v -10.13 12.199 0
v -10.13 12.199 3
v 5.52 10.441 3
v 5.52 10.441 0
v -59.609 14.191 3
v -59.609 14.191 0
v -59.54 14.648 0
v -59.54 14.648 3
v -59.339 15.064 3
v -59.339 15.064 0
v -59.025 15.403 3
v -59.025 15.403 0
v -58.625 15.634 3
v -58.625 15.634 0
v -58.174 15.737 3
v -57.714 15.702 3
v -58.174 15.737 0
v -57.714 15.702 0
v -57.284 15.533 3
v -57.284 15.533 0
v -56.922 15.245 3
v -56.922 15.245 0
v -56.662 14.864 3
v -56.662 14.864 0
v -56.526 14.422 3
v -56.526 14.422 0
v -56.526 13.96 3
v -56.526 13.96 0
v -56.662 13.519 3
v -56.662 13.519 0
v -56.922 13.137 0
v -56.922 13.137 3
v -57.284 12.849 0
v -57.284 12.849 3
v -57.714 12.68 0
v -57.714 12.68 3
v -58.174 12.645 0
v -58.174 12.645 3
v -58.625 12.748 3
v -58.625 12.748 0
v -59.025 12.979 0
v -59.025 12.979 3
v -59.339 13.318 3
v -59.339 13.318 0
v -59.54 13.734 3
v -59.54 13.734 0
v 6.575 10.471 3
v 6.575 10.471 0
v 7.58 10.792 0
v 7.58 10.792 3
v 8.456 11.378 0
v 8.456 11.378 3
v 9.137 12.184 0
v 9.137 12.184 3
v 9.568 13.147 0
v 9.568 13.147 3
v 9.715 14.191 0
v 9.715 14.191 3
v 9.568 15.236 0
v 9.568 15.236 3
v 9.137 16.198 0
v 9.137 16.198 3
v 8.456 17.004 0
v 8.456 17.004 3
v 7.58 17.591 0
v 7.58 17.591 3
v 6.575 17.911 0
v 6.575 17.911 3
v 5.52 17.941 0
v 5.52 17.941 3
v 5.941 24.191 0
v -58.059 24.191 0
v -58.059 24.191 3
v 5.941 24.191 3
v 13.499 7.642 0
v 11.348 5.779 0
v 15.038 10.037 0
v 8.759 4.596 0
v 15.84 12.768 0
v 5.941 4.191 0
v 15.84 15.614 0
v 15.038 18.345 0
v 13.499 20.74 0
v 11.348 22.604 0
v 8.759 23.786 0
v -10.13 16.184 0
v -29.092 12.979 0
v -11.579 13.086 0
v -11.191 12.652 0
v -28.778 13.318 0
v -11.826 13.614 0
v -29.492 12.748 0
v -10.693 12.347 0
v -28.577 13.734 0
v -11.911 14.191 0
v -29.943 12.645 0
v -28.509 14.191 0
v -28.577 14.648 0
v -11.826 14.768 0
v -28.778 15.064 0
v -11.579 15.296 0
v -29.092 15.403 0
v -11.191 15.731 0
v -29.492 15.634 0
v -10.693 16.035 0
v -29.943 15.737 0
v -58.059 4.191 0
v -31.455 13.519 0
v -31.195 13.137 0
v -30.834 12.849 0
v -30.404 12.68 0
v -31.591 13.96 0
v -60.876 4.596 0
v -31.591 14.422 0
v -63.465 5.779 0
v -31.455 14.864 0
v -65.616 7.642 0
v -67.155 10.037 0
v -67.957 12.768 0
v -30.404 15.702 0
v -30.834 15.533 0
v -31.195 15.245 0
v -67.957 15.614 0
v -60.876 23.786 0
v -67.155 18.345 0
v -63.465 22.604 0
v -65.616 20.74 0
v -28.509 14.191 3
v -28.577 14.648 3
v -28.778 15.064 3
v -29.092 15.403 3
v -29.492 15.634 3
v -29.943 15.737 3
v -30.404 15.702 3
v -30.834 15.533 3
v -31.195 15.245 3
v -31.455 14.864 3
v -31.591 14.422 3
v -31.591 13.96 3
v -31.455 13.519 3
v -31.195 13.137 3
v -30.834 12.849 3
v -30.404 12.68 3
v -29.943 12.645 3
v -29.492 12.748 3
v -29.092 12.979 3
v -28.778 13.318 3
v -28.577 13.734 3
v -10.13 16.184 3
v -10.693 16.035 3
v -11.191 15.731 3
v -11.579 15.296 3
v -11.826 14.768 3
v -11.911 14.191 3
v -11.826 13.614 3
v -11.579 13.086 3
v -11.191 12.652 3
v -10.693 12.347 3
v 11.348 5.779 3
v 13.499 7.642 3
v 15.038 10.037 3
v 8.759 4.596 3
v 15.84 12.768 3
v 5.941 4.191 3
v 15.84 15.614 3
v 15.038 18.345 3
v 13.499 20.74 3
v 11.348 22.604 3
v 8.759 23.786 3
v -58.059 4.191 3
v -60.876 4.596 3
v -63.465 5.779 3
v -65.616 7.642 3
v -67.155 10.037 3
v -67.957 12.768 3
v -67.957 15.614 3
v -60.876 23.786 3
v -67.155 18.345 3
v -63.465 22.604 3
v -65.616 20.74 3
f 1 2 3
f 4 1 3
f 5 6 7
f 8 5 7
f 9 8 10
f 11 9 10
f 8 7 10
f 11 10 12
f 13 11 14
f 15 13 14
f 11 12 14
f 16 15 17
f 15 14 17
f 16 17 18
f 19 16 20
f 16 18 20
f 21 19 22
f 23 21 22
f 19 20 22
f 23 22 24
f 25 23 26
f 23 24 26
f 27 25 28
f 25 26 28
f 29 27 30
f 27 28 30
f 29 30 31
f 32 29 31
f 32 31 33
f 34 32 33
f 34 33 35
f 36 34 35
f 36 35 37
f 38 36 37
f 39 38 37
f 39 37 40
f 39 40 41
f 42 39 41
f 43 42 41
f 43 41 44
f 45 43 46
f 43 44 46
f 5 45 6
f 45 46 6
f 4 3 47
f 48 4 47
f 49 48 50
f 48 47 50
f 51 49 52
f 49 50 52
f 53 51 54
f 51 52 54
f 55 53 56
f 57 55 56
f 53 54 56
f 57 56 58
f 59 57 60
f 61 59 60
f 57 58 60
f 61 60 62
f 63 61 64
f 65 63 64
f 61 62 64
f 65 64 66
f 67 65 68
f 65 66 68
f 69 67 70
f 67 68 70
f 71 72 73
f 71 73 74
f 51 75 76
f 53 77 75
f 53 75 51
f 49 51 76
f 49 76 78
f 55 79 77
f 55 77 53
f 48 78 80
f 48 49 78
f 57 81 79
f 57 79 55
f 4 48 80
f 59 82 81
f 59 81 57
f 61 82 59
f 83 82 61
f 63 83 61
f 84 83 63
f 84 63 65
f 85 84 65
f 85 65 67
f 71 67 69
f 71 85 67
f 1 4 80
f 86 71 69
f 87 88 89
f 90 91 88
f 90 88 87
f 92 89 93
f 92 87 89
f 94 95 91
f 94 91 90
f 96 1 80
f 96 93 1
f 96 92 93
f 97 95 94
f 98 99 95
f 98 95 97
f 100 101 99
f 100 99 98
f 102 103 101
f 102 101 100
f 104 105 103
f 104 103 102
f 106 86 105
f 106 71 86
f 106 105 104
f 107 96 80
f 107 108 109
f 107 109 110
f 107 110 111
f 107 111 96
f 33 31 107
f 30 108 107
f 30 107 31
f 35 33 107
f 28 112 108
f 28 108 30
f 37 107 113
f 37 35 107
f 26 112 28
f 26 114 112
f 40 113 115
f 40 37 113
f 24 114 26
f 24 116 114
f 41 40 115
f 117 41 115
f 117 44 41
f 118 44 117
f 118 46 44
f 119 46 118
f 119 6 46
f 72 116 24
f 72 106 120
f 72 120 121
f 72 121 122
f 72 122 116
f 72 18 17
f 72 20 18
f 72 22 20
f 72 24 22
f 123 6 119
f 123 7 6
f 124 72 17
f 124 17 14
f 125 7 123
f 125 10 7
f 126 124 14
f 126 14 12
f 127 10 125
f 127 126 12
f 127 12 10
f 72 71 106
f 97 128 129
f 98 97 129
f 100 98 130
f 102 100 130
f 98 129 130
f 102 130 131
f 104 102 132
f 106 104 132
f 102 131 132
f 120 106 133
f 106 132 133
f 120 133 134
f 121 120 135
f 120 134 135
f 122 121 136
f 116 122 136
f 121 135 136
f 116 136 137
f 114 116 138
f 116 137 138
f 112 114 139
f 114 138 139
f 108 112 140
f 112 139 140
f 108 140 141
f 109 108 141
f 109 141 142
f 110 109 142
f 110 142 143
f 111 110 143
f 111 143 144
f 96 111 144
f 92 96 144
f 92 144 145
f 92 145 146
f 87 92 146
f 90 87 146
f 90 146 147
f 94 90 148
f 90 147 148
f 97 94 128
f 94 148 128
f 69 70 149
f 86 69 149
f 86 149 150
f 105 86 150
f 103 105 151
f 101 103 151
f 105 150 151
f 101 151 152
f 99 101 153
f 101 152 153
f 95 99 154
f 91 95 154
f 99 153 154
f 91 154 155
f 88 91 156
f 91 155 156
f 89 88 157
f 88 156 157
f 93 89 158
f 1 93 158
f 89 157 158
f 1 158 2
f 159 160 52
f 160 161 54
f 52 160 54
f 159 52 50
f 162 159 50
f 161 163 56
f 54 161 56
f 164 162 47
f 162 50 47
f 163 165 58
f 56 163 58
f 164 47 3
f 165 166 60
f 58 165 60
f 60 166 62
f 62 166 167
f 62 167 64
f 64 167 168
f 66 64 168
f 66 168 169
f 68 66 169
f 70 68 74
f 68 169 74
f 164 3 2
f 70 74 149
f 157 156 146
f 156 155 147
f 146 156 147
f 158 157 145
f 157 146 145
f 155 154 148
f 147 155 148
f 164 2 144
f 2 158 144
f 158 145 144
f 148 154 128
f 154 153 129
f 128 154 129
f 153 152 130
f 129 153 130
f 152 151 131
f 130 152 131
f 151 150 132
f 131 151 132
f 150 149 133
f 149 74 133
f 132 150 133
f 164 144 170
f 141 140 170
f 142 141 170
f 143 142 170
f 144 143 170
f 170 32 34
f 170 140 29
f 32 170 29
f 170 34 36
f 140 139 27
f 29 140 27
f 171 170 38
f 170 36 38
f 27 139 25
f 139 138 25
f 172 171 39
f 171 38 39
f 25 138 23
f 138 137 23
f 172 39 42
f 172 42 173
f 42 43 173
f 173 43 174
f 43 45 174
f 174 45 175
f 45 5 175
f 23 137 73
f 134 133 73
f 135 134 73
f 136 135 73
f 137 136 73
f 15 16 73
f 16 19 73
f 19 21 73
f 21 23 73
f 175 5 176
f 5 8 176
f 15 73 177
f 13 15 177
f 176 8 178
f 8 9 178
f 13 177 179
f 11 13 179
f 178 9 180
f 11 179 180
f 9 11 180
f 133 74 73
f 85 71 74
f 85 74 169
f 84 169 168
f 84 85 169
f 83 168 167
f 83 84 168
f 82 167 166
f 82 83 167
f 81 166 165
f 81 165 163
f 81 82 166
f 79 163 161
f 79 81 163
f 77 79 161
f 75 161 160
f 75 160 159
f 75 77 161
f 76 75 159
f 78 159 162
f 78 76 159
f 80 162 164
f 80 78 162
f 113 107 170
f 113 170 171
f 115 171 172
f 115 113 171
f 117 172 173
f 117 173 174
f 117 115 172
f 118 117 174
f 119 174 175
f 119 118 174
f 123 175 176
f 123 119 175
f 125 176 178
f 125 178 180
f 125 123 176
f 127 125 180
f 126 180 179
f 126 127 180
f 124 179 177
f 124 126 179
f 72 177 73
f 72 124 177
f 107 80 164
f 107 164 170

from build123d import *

# Parameters (mm, degrees)
BOSS_EXTRUDE1_DEPTH = 3
CUT_EXTRUDE1_DEPTH  = 3
SKETCH4_R           = 1.55
CUT_EXTRUDE4_DEPTH  = 3
SKETCH5_R           = 1.55
CUT_EXTRUDE6_DEPTH  = 3


with BuildPart() as part:
    # Sketch1 → Boss-Extrude1 (new body)
    with BuildSketch(Plane.XY):
        with BuildLine():
            Line((-58.058617241, 24.191090517), (5.941382759, 24.191090517))
            ThreePointArc((5.941382759, 24.191090517), (15.941382759, 14.191090517), (5.941382759, 4.191090517))
            Line((5.941382759, 4.191090517), (-58.058617241, 4.191090517))
            ThreePointArc((-58.058617241, 4.191090517), (-68.058617241, 14.191090517), (-58.058617241, 24.191090517))
        make_face()
    extrude(amount=BOSS_EXTRUDE1_DEPTH)

    # Sketch2 → Cut-Extrude1 (cut)
    with BuildSketch(Plane.XY.offset(3)):
        with BuildLine():
            Line((5.520256561, 17.941090517), (-10.129743439, 16.183590517))
            ThreePointArc((-10.129743439, 16.183590517), (-11.911009757, 14.191090517), (-10.129743439, 12.198590517))
            Line((-10.129743439, 12.198590517), (5.520256561, 10.441090517))
            ThreePointArc((5.520256561, 10.441090517), (9.714954976, 14.191090517), (5.520256561, 17.941090517))
        make_face()
    extrude(amount=-CUT_EXTRUDE1_DEPTH, mode=Mode.SUBTRACT)

    # Sketch4 → Cut-Extrude4 (cut)
    with BuildSketch(Plane(origin=(9.979459273, 1.433252018, 3), x_dir=(1, 0, 0), z_dir=(0, 0, 1))):
        with Locations((-40.038076514, 12.757838499)):
            Circle(SKETCH4_R)
    extrude(amount=-CUT_EXTRUDE4_DEPTH, mode=Mode.SUBTRACT)

    # Sketch5 → Cut-Extrude6 (cut)
    with BuildSketch(Plane(origin=(-9.979459273, 1.433252018, 0), x_dir=(-1, 0, 0), z_dir=(0, 0, -1))):
        with Locations((48.079157968, 12.757838499)):
            Circle(SKETCH5_R)
    extrude(amount=-CUT_EXTRUDE6_DEPTH, mode=Mode.SUBTRACT)


solid = part.part
